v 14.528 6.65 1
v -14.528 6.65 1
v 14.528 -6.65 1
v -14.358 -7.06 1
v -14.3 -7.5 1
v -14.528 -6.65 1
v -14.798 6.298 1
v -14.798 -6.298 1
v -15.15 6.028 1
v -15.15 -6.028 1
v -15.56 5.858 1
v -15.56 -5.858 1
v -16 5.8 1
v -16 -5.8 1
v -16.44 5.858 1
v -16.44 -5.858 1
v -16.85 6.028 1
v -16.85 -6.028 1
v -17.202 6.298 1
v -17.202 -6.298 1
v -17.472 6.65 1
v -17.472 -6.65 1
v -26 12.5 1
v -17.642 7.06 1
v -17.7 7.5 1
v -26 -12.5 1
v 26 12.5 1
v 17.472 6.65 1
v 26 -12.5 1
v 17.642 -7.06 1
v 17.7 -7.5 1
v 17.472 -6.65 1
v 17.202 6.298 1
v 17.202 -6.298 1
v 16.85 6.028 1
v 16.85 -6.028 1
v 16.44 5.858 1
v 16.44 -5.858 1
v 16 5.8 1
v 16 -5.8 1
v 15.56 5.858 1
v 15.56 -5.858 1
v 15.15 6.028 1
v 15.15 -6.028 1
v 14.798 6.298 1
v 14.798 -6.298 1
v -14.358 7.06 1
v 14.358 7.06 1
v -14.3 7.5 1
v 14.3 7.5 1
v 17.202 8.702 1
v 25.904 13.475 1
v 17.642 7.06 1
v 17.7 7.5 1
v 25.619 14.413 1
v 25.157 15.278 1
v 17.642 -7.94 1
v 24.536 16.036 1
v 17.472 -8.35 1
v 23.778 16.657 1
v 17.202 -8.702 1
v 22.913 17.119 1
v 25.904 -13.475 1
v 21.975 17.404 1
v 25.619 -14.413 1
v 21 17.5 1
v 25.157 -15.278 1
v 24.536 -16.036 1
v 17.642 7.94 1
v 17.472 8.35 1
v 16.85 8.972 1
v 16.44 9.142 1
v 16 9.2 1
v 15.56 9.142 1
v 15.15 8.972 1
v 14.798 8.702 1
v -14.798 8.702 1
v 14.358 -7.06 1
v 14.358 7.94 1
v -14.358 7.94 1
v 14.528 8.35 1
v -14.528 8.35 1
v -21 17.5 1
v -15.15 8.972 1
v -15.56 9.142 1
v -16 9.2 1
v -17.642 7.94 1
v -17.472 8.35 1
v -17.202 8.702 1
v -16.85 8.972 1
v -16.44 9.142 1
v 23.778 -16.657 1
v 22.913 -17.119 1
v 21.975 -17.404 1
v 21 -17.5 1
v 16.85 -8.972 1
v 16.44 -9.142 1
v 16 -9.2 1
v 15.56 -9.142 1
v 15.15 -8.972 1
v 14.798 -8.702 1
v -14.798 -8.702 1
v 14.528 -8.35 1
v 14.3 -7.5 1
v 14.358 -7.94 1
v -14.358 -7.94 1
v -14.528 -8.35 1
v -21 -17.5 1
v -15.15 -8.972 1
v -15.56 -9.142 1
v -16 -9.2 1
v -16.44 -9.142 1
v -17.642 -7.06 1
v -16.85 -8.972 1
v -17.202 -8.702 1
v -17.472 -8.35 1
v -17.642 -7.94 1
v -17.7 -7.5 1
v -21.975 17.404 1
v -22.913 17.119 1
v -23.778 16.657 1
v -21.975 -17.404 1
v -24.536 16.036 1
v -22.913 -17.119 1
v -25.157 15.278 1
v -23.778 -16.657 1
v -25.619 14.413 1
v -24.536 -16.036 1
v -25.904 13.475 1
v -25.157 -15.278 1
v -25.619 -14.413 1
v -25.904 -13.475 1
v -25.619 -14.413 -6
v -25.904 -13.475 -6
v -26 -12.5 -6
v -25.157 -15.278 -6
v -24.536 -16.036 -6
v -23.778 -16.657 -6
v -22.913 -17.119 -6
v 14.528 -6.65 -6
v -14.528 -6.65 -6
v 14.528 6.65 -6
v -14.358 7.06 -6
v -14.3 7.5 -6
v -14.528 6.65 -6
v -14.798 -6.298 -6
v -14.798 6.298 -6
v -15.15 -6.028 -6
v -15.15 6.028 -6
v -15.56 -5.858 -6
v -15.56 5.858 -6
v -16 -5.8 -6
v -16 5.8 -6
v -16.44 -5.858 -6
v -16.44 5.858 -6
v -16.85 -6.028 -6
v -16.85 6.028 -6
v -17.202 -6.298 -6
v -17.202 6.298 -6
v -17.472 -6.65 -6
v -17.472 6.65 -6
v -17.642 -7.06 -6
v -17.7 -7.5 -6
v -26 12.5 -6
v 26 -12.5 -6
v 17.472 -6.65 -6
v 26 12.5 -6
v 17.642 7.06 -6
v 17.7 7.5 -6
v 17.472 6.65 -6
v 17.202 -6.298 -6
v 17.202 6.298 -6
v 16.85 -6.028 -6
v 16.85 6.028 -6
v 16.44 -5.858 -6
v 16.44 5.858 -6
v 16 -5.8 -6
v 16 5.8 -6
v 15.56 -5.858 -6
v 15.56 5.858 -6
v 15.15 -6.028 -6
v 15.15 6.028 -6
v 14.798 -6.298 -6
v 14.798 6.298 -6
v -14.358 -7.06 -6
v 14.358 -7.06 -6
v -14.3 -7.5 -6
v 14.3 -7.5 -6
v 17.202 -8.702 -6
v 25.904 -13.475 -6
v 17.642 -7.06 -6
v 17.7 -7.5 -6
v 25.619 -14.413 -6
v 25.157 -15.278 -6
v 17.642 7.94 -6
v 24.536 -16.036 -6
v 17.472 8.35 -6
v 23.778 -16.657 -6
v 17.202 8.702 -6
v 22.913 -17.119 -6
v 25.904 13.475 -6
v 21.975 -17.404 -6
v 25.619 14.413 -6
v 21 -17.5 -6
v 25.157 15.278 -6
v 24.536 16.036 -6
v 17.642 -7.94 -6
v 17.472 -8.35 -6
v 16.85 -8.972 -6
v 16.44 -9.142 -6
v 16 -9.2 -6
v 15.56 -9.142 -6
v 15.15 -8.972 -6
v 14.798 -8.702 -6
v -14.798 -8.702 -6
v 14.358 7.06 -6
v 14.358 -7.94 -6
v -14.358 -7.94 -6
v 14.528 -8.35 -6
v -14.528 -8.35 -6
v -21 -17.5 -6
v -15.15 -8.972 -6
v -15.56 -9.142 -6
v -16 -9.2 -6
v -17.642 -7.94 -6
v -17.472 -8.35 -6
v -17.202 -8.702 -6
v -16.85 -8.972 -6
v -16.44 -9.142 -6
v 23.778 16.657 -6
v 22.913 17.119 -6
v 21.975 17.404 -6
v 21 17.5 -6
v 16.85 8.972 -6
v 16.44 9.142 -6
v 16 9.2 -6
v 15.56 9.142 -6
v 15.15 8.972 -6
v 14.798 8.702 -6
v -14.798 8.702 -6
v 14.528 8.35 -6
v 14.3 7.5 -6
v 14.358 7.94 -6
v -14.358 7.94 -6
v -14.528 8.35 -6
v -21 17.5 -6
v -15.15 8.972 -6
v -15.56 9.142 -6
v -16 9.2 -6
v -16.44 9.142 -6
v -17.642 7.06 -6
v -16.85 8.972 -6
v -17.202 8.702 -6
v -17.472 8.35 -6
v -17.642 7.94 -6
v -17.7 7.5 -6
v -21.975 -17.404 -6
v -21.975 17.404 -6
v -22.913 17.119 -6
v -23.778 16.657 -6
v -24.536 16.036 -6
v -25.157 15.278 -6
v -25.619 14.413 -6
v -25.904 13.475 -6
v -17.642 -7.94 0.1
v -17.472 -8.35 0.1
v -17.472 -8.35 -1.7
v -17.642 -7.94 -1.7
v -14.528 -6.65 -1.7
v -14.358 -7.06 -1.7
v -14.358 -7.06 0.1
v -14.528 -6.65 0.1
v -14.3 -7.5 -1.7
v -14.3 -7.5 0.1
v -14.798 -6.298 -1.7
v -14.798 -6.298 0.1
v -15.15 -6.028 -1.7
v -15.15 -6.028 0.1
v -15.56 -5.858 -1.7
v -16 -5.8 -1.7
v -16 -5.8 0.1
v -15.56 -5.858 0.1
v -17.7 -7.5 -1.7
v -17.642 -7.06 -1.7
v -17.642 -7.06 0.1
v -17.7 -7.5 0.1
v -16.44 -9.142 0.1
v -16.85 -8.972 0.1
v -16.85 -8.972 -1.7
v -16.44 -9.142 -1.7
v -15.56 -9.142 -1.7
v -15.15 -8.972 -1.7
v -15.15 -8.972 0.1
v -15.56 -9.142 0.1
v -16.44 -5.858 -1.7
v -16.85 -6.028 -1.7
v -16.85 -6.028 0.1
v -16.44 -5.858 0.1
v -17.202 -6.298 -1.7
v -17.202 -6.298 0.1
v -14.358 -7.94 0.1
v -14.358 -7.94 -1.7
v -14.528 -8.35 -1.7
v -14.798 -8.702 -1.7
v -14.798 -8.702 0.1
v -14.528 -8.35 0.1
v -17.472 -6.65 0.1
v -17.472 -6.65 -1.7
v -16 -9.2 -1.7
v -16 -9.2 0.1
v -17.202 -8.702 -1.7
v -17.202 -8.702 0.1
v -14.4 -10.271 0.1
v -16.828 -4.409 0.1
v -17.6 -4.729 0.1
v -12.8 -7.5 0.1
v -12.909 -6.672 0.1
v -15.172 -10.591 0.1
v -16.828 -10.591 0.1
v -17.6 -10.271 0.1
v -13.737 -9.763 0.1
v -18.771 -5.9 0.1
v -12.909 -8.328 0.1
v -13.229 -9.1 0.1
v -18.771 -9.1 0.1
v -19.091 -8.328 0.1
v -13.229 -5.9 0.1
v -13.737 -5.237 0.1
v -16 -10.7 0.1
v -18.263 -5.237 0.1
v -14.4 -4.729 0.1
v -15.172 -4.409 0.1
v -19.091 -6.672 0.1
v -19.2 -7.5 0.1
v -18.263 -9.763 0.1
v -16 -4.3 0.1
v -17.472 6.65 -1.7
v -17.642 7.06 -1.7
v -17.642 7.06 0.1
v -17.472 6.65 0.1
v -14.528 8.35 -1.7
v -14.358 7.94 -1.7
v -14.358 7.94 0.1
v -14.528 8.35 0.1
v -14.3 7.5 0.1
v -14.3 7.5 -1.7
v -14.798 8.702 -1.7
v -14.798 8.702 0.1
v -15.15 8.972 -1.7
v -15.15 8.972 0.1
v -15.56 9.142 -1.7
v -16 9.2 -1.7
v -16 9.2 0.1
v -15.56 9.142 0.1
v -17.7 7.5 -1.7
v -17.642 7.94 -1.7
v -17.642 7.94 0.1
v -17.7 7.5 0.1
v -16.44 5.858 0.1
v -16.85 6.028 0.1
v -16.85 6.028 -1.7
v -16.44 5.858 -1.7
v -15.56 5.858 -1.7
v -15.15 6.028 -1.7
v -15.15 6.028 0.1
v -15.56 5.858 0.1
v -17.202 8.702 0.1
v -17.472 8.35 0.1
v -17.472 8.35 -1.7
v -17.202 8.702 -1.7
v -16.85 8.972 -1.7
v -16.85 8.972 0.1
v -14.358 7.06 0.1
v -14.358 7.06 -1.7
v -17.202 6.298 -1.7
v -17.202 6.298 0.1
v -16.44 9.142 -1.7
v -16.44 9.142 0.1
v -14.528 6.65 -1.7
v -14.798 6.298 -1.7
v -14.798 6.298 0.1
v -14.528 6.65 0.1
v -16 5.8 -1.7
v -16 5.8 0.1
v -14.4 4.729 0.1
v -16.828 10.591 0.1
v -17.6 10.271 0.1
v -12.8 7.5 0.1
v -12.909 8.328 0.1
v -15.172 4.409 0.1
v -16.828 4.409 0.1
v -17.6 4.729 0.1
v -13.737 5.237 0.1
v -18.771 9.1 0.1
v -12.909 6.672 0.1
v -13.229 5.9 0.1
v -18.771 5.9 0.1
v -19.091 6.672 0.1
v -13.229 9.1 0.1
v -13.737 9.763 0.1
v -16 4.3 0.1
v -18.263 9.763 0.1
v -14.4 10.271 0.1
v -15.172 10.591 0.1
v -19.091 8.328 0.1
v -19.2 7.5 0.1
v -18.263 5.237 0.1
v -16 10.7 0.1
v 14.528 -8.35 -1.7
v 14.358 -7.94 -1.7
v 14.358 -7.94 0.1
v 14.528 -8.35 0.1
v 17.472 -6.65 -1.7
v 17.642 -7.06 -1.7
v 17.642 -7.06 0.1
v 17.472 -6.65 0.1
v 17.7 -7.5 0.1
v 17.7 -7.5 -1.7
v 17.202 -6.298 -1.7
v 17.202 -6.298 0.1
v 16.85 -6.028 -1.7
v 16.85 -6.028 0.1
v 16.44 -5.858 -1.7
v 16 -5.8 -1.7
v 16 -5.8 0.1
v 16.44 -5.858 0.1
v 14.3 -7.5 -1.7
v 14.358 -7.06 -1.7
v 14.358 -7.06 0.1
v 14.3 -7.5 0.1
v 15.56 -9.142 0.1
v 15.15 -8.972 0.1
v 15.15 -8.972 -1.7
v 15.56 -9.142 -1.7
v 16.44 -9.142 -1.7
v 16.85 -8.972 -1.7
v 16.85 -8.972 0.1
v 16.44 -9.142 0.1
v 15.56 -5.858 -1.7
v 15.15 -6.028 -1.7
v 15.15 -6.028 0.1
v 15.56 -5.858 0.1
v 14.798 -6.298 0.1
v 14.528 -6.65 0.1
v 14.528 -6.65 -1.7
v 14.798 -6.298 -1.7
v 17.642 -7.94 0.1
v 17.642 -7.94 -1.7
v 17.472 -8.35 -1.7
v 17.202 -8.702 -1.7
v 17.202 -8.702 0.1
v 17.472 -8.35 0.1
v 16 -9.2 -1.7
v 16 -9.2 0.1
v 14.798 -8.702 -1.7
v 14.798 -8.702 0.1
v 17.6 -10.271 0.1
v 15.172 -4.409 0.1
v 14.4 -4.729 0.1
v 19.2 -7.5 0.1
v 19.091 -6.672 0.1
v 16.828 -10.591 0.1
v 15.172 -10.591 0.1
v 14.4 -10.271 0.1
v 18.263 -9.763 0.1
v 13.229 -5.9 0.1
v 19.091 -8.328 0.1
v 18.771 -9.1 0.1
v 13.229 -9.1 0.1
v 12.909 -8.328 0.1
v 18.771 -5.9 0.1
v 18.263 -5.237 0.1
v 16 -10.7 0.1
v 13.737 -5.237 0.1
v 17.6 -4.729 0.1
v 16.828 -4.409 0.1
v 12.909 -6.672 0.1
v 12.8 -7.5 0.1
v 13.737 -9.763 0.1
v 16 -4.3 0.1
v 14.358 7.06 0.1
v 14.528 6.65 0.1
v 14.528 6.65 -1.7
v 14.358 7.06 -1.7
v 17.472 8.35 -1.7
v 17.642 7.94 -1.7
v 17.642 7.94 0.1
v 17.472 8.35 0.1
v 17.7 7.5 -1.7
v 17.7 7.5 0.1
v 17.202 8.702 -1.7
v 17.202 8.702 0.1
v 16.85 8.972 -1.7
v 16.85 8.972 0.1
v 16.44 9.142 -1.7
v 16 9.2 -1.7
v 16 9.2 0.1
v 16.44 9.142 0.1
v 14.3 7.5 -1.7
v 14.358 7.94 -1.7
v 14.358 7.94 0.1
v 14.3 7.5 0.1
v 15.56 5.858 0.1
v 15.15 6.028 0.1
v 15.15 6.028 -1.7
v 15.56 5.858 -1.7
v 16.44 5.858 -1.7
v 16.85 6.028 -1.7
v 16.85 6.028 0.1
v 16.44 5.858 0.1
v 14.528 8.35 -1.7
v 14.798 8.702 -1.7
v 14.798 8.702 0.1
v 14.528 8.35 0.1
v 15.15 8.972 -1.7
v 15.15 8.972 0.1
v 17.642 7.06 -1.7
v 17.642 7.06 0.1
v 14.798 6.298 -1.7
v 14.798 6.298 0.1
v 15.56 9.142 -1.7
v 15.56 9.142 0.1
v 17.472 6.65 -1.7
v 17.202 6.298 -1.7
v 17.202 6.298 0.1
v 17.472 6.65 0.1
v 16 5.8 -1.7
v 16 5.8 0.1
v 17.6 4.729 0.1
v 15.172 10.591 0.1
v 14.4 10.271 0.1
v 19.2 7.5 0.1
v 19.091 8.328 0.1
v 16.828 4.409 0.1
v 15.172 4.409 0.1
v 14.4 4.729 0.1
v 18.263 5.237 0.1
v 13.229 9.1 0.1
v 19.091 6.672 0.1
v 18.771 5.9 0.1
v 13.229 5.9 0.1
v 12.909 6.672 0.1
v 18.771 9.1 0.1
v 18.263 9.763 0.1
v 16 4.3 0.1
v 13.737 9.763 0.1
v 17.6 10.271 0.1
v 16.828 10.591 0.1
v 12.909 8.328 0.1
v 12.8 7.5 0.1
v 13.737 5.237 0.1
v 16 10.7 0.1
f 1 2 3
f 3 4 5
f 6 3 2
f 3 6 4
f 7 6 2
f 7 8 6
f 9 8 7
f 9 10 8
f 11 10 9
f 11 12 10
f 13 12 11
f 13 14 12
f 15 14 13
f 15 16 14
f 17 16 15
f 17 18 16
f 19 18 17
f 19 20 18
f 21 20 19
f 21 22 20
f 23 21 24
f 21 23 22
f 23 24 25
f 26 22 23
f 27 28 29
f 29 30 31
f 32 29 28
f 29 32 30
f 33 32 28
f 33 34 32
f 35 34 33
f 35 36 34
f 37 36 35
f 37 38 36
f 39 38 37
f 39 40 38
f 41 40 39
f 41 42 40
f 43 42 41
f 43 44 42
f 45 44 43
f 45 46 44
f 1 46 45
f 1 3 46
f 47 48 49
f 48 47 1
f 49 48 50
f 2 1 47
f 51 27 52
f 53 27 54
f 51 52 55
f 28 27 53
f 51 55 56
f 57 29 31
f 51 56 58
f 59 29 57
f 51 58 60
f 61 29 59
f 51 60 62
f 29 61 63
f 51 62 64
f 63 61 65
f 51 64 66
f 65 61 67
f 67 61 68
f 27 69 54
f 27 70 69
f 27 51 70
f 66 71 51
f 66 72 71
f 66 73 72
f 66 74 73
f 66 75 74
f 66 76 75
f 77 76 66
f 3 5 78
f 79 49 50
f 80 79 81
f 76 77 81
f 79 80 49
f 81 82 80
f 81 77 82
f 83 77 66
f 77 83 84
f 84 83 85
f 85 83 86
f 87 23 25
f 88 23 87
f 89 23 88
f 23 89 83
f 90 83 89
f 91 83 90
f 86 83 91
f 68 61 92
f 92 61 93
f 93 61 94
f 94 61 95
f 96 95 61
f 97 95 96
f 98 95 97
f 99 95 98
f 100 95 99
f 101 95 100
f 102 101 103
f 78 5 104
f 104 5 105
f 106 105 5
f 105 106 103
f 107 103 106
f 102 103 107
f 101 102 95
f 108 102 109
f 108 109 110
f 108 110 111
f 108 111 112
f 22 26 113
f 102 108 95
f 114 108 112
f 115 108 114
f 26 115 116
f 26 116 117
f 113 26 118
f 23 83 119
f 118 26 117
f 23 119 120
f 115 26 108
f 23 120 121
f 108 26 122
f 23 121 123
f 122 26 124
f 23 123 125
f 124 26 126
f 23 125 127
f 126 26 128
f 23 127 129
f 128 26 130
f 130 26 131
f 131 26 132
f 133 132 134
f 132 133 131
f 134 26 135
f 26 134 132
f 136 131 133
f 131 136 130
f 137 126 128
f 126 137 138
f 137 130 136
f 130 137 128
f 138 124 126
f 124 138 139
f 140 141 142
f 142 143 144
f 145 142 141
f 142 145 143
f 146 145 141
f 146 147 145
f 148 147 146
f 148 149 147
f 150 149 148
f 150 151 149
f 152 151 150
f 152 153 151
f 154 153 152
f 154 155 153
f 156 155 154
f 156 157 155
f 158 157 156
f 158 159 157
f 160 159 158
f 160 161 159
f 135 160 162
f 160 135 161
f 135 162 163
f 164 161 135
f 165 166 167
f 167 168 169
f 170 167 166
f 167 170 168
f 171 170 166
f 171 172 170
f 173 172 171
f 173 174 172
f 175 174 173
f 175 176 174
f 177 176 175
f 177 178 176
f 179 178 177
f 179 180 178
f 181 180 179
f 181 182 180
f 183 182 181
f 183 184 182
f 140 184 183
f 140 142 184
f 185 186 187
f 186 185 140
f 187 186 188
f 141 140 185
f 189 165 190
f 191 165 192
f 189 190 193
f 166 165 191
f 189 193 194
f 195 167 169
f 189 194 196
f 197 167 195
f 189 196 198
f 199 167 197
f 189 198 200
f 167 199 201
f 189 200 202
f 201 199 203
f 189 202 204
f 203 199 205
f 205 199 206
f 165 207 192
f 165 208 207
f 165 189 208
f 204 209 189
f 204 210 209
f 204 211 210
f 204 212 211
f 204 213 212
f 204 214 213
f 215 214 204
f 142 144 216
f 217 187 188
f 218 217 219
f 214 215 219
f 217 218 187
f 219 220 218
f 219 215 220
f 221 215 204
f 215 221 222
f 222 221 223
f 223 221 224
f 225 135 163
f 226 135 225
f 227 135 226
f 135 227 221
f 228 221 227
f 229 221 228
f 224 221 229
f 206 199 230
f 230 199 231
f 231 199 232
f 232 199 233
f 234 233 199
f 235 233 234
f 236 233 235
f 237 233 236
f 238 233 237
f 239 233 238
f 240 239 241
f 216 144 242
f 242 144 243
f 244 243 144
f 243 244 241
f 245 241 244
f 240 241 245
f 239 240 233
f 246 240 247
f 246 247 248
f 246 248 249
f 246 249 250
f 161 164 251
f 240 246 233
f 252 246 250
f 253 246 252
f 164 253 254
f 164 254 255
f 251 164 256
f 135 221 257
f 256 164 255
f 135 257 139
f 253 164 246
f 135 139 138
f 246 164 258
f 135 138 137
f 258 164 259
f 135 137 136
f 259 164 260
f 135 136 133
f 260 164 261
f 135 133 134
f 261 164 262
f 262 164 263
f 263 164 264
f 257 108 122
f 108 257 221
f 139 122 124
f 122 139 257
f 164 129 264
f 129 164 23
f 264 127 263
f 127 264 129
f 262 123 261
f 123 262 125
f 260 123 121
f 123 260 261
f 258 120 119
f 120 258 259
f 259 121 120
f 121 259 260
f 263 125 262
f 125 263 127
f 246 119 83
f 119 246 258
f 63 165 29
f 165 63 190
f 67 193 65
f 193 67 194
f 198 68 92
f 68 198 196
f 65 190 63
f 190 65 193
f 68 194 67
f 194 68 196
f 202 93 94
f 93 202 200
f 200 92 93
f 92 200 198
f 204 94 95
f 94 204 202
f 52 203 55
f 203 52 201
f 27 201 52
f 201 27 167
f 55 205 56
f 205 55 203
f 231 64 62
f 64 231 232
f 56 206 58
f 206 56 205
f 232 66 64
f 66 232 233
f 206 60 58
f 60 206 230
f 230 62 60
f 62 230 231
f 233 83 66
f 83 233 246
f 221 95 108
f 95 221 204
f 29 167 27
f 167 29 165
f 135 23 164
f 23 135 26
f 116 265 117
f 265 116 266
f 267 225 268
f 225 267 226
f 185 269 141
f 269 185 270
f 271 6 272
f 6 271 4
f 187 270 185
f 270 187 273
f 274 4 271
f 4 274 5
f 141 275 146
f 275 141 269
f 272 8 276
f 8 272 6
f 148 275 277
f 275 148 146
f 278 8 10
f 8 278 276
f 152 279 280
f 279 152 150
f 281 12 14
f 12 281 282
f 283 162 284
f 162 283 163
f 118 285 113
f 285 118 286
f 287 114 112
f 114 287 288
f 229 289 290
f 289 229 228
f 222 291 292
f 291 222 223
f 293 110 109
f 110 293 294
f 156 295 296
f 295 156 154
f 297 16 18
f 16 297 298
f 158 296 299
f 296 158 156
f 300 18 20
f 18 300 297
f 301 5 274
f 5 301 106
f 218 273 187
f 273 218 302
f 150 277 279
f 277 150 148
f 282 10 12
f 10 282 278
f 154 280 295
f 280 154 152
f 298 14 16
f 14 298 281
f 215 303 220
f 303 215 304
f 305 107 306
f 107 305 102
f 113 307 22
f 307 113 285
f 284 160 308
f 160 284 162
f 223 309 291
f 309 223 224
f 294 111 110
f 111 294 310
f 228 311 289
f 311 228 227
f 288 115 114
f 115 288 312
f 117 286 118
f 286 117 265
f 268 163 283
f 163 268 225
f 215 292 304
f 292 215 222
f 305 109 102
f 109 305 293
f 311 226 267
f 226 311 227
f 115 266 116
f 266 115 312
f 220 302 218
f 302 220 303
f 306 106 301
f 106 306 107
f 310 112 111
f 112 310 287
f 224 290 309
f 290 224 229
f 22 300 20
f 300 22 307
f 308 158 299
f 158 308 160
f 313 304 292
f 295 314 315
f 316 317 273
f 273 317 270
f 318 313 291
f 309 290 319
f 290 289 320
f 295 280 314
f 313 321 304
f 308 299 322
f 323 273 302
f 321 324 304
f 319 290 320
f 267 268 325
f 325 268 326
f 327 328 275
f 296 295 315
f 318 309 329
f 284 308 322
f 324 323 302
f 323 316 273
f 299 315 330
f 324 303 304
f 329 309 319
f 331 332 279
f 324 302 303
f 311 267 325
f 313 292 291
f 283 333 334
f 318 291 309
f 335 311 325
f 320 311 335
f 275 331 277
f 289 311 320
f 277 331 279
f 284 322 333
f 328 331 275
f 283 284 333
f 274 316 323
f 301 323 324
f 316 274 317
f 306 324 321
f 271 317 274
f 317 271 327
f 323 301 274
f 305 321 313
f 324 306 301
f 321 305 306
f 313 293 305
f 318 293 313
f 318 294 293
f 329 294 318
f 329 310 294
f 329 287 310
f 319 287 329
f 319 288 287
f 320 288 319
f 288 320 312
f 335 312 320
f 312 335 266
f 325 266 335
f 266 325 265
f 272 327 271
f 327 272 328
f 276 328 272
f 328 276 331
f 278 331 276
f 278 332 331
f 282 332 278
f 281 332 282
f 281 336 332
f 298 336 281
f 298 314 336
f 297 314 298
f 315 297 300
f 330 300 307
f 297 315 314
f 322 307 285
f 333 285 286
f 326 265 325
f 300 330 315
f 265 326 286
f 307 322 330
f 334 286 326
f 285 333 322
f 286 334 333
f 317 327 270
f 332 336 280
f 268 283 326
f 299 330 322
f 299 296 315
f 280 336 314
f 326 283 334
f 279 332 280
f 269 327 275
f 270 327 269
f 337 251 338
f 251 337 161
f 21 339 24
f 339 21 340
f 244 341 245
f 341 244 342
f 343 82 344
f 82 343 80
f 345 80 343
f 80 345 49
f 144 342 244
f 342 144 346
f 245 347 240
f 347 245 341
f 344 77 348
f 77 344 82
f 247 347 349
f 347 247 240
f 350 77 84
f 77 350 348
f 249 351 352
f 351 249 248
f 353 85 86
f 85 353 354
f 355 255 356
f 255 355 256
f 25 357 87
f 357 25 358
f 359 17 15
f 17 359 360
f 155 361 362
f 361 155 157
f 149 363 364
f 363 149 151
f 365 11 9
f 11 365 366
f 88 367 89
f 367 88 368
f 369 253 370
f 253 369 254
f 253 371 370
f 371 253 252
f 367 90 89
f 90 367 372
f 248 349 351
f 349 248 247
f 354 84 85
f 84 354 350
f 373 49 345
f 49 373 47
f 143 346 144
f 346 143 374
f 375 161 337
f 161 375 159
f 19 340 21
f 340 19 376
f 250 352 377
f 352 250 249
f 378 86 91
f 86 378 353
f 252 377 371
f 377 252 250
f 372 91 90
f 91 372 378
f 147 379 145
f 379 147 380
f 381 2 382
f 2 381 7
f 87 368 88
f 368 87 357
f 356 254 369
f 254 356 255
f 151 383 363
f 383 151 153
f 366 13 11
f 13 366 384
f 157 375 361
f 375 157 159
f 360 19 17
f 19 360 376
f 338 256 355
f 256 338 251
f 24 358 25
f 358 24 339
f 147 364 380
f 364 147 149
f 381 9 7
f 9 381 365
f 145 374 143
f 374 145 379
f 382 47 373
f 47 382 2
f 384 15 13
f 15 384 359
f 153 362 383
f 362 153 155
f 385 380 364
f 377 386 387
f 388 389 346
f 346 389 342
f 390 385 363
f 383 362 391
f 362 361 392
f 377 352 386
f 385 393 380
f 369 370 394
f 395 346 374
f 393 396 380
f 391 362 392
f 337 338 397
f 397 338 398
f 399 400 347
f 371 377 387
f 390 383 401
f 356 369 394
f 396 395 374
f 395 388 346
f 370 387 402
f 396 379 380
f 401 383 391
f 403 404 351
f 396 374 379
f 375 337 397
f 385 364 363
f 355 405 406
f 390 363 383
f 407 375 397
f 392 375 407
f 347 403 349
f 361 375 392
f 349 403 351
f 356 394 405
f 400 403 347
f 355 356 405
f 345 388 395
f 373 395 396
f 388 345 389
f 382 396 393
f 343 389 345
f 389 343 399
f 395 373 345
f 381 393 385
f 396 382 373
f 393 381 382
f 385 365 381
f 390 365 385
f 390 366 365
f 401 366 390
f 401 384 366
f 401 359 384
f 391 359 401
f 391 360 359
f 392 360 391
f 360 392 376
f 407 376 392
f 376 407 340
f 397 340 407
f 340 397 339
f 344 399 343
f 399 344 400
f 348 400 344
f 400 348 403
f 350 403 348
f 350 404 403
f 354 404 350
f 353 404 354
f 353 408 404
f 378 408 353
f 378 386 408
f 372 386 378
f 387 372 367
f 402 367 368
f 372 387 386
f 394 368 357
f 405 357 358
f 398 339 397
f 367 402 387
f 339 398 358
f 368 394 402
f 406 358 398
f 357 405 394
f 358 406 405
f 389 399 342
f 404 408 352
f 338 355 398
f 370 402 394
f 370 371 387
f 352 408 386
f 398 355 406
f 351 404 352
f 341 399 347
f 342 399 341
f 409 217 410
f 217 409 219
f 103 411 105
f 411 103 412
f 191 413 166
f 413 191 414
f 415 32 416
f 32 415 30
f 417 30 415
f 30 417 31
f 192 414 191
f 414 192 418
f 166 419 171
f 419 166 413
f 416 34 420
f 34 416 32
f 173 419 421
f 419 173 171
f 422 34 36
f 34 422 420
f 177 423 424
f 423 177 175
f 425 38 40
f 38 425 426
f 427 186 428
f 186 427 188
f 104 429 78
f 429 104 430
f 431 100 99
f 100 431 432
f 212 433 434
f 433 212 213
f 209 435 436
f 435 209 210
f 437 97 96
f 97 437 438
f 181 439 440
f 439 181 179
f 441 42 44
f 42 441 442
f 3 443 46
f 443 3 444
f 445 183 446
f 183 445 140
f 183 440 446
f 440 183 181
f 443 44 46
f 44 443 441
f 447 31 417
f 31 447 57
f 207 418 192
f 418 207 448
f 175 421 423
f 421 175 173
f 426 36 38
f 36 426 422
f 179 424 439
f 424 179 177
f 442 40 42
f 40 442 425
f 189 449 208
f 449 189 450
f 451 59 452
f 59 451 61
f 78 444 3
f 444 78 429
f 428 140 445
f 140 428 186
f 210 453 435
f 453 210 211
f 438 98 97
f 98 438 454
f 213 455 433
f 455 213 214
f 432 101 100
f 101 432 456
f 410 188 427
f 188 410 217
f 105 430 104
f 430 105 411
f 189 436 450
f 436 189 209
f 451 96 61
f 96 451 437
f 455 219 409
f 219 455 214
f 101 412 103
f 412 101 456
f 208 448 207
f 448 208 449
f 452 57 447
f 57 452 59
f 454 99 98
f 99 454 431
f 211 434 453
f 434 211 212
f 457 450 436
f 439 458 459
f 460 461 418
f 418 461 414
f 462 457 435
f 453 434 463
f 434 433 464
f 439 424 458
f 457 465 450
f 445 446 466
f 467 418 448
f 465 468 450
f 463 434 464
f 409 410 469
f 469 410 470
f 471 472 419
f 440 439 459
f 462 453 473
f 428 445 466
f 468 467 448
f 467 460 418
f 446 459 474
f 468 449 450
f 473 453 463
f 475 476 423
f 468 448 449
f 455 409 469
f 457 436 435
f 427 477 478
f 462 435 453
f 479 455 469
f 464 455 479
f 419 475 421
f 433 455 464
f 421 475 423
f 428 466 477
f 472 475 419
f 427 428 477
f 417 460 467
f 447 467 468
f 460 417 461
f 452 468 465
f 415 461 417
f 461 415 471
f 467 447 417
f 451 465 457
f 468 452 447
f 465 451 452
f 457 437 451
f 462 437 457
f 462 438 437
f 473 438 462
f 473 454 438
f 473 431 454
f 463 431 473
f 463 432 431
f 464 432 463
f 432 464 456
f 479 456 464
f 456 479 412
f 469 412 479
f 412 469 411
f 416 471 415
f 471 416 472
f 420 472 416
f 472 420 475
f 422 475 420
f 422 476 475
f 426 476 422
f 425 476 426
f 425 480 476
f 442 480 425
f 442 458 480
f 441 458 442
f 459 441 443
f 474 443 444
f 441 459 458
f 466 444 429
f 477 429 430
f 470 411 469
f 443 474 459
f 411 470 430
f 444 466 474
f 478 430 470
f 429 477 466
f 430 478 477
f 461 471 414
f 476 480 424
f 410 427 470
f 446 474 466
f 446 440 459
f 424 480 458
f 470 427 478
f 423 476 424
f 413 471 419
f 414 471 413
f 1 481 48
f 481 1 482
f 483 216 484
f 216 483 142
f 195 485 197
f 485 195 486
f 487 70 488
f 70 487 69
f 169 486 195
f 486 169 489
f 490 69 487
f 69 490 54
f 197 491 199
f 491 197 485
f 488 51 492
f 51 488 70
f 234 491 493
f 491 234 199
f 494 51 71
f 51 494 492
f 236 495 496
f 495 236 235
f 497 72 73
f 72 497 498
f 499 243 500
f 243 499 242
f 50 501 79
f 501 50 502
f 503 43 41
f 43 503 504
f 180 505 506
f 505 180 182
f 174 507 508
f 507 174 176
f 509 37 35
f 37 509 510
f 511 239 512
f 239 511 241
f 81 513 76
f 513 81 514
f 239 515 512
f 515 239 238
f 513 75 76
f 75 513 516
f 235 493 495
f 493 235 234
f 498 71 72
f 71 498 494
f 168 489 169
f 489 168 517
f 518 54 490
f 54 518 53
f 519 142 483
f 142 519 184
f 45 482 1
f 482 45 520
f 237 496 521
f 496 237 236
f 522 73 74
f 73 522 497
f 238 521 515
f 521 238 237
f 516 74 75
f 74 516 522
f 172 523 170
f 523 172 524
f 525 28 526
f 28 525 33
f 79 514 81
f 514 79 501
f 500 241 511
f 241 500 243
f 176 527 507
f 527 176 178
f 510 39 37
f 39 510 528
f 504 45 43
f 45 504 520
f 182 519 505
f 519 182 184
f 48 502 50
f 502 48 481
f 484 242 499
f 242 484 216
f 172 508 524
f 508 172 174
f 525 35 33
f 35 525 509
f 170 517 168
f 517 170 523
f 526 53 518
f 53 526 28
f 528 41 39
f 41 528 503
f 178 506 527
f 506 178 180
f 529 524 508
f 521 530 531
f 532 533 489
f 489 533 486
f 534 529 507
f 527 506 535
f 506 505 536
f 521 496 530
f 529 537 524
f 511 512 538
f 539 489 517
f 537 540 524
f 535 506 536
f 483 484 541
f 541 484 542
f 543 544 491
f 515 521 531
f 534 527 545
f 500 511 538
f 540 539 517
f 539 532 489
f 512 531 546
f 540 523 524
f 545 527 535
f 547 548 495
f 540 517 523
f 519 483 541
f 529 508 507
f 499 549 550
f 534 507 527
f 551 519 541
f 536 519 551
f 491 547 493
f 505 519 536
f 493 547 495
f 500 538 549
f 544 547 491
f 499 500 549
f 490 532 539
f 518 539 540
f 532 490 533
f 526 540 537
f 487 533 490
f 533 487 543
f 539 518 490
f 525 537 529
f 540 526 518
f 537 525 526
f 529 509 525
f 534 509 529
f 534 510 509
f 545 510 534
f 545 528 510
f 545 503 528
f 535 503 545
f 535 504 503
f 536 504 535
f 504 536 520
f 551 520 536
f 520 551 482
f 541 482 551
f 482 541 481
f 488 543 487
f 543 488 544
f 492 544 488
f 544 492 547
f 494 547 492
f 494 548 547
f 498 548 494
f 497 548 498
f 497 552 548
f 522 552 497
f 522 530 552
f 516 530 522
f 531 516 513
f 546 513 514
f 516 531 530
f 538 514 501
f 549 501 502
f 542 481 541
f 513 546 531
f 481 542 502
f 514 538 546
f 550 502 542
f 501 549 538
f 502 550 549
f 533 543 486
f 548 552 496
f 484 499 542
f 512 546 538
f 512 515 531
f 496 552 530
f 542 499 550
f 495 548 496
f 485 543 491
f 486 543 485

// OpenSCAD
/* ============================================================
   AI SMART BIN  -  sorting tray

   Bolts to the tilt servo. Rubbish lands here, the camera looks
   at it, then the tray tips and drops it into one of three bins.

   THE SHAPE
   A shallow saddle, like a Pringle, same as the Ameru tray.
   NO RIM ANYWHERE. The surface runs straight out to a thin
   edge. A rim would trap the item exactly when you are trying
   to tip it out, which is the opposite of the job.

     ACROSS  (the tilt axis)   sides curl UP 10mm.
       When the head pans, the item gets thrown sideways along
       this axis, and this gentle valley rolls it back to the
       middle. That is the only retention there is, and it is
       enough because it works with gravity rather than
       blocking anything.

     ALONG   (the dump direction)   ends curl DOWN 5mm.
       Where the item leaves. Curling down means there is
       nothing at all to climb, so it goes as soon as it tips.

   HOW STEEP THE ENDS CAN BE
   drop_end is a real trade-off. Curl down too hard and the item
   creeps off on its own while the head is still panning. At 5mm
   the steepest slope is about 9.5 degrees, well under the
   roughly 19 degrees where plastic starts sliding on PLA, so it
   stays put until you actually tip it. Past about 8mm you are
   relying on luck.

   WHAT TO PRINT
     1 x tray     saddle side UP, with a brim.
                  A saddle has no flat face, so this one part
                  does need light support under the two ends and
                  the outer underside. Roughly 8g, and it snaps
                  off a convex surface easily. The top face, the
                  one the camera sees and the item slides on,
                  prints upward and comes out clean.
     1 x spacer   sets the gap between tray and servo bracket.

   PRINT IT IN A PLAIN LIGHT COLOUR. The camera classifies the
   item against this background, so a busy or shiny surface
   costs you accuracy. Matte white or grey. Not the silk blue.
   ============================================================ */

PART = "tray";      // "tray" | "spacer" | "preview"


/* ---------- MEASURE THESE ----------
   The bolt pattern on your tilt plate. Take the servo horn or the
   MakerWorld bracket's top plate and measure hole to hole.       */

bolt_dx    = 32;    // hole spacing across the tray
bolt_dy    = 15;    // hole spacing along the tray
bolt_d     = 3.4;   // M3 clearance
bolt_csk   = 6.4;   // M3 countersunk head
spacer_h   = 12;    // gap between tray underside and the tilt plate.
                    //   Enough that the tray clears the bracket arms
                    //   at full tilt. Measure, then reprint if wrong.


/* ---------- SHAPE ---------- */

tray_l     = 120;   // X, the dump direction (ends curl down)
tray_w     = 90;    // Y, along the tilt axis (sides curl up)
rise_side  = 10;    // how far the two long sides curl UP.
                    //   MORE = rolls back to the middle harder
drop_end   = 5;     // how far the two ends curl DOWN.
                    //   MORE = dumps easier, but see the note above
shell_t    = 3;     // wall thickness. It is a shell, not a slab.
end_w      = 12;    // blunt width at the two ends, so they are not points
boss_h     = 3;     // extra material under the middle for the bolts

slices     = 72;    // smoothness along the length
steps      = 28;    // smoothness across the width


/* ------------------------------------------------------------
   The surface: z = rise*(y/half_w)^2 - drop*(x/half_l)^2, a
   hyperbolic paraboloid. Built as a stack of thin cross-sections,
   because the shape is separable: the profile across is the same
   everywhere and simply gets lowered as you move toward an end.
   ------------------------------------------------------------ */

function sag(x)  = drop_end  * pow(x / (tray_l / 2), 2);
function rise(y) = rise_side * pow(y / (tray_w / 2), 2);

// half width at position x, so the outline is a rounded oval
function hw(x) = max(end_w / 2,
                     (tray_w / 2) * sqrt(max(0, 1 - pow(x / (tray_l / 2), 2))));


// Built as one polyhedron over a grid. Not stacked slabs (the oval edge
// comes out visibly stair-stepped) and not hulled slices (hull() takes the
// CONVEX hull, which fills the valley in and turns the shell into a wedge).
nx = 140;   // grid points along the length
ny = 44;    // grid points across the width

function gx(i) = -tray_l / 2 + tray_l * i / (nx - 1);
function gy(i, j) = let (h = hw(gx(i))) -h + 2 * h * j / (ny - 1);
function gz(i, j) = rise(gy(i, j)) - sag(gx(i));

function T(i, j) = i * ny + j;
function B(i, j) = nx * ny + i * ny + j;

module saddle() {
    polyhedron(
        points = concat(
            [for (i = [0:nx-1], j = [0:ny-1]) [gx(i), gy(i,j), gz(i,j)]],
            [for (i = [0:nx-1], j = [0:ny-1]) [gx(i), gy(i,j), gz(i,j) - shell_t]]
        ),
        faces = concat(
            // the surface the rubbish sits on
            [for (i = [0:nx-2], j = [0:ny-2])
                [T(i,j), T(i,j+1), T(i+1,j+1), T(i+1,j)]],
            // underside
            [for (i = [0:nx-2], j = [0:ny-2])
                [B(i,j), B(i+1,j), B(i+1,j+1), B(i,j+1)]],
            // the thin edge, all the way round
            [for (i = [0:nx-2]) [T(i,0), T(i+1,0), B(i+1,0), B(i,0)]],
            [for (i = [0:nx-2]) [T(i,ny-1), B(i,ny-1), B(i+1,ny-1), T(i+1,ny-1)]],
            [for (j = [0:ny-2]) [T(0,j), B(0,j), B(0,j+1), T(0,j+1)]],
            [for (j = [0:ny-2]) [T(nx-1,j), T(nx-1,j+1), B(nx-1,j+1), B(nx-1,j)]]
        ),
        convexity = 10
    );
}


// A rounded rectangle, as four corner posts bridged by two slabs.
// This is exactly hull() of the same four posts: at $fn = 32 each post has a
// vertex square on every axis, so the slab edges meet the posts on their flats
// with nothing sticking out. Written the long way because hull() does not
// convert to STEP, and both the boss and the spacer want this shape.
module rrect(dx, dy, d, h) {
    r = d / 2;
    union() {
        for (x = [-dx / 2, dx / 2], y = [-dy / 2, dy / 2])
            translate([x, y, 0])
                cylinder(d = d, h = h, $fn = 32);
        translate([-dx / 2, -dy / 2 - r, 0]) cube([dx, dy + 2 * r, h]);
        translate([-dx / 2 - r, -dy / 2, 0]) cube([dx + 2 * r, dy, h]);
    }
}


module tray() {
    difference() {
        union() {
            saddle();
            // small boss under the middle, so the bolts have real
            // material to sit in rather than 3mm of shell. It is hidden
            // by the spacer, so it costs nothing.
            translate([0, 0, -shell_t - boss_h])
                rrect(bolt_dx + 10, bolt_dy + 10, 10, boss_h + shell_t + 1);
        }

        // mounting bolts, countersunk from above so the heads finish
        // flush with the saddle and nothing catches on them
        for (x = [-bolt_dx / 2, bolt_dx / 2], y = [-bolt_dy / 2, bolt_dy / 2])
            translate([x, y, 0]) {
                translate([0, 0, -shell_t - boss_h - 1])
                    cylinder(d = bolt_d, h = boss_h + shell_t + 3, $fn = 24);
                translate([0, 0, -1.7])
                    cylinder(d1 = bolt_d, d2 = bolt_csk, h = 1.8, $fn = 24);
            }
    }
}


module spacer() {
    difference() {
        rrect(bolt_dx, bolt_dy, 11, spacer_h);
        for (x = [-bolt_dx / 2, bolt_dx / 2], y = [-bolt_dy / 2, bolt_dy / 2])
            translate([x, y, -1])
                cylinder(d = bolt_d, h = spacer_h + 2, $fn = 24);
    }
}


/* ---------- output ---------- */

echo(str("sides curl UP ", rise_side, "mm, steepest ",
         atan(2 * rise_side / (tray_w / 2)),
         " deg  (rolls the item back to the middle)"));
echo(str("ends curl DOWN ", drop_end, "mm, steepest ",
         atan(2 * drop_end / (tray_l / 2)),
         " deg  (keep under ~19 or it creeps off by itself)"));
echo(str("overall ", tray_l, " x ", tray_w, " x ",
         rise_side + drop_end + shell_t, "mm"));

if (PART == "tray")        tray();
else if (PART == "spacer") spacer();
else {
    tray();
    translate([0, 0, -shell_t - boss_h - spacer_h])
        color("orange") spacer();
}
